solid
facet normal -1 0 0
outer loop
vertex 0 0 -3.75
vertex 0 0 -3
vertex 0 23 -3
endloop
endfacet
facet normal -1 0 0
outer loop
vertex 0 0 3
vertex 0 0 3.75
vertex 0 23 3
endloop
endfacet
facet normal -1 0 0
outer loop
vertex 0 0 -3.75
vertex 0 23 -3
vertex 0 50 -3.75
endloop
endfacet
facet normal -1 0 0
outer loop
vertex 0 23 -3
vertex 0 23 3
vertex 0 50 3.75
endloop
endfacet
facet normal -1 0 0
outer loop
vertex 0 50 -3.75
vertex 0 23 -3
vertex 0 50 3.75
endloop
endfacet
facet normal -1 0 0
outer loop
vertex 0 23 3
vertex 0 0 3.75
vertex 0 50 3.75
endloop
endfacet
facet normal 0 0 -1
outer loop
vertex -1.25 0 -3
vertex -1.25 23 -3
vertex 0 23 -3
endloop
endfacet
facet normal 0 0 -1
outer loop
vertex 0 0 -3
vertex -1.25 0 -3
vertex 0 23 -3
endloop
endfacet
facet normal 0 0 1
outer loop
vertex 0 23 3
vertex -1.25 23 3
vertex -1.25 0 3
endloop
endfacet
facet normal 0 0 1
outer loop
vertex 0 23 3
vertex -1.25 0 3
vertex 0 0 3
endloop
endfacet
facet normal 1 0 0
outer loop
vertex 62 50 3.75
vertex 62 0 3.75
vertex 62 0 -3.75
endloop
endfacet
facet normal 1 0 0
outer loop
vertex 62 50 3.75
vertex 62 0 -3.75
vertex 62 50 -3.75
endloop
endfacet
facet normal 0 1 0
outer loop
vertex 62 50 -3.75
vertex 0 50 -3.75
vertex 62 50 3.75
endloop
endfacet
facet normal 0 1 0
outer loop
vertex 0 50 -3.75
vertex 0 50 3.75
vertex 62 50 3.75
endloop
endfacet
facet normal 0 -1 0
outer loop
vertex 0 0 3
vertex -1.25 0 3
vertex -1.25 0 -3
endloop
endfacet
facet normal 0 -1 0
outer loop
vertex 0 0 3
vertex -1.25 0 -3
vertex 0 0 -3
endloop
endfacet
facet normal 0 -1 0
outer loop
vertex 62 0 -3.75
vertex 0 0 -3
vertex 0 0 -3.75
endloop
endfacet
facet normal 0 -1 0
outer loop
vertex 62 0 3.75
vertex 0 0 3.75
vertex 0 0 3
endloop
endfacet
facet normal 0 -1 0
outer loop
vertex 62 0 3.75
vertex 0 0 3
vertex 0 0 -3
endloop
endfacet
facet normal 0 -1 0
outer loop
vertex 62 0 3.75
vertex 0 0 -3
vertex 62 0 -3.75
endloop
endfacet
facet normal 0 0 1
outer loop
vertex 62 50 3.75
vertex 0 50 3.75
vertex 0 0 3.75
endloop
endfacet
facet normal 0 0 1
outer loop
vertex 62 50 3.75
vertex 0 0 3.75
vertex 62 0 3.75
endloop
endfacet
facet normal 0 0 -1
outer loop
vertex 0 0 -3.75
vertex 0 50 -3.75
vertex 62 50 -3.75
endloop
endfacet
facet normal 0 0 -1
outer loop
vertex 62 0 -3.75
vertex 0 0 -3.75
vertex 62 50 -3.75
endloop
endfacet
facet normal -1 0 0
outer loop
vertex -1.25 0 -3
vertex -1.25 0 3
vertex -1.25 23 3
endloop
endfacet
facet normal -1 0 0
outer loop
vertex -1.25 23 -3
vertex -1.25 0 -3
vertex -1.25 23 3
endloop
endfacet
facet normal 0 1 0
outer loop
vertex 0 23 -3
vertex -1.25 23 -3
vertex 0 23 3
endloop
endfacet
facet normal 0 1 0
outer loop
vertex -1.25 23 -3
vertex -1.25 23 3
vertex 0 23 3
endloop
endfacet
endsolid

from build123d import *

# Parameters (mm, degrees)
SKETCH_W     = 62
SKETCH_H     = 50
PAD_DEPTH    = 3.75
SKETCH001_W  = 1.25
SKETCH001_H  = 23
PAD001_DEPTH = 3


with BuildPart() as part:
    # Sketch → Pad (new body, symmetric)
    with BuildSketch(Plane.XY):
        with Locations((31, 25)):
            Rectangle(SKETCH_W, SKETCH_H)
    extrude(amount=PAD_DEPTH, both=True)

    # Sketch001 → Pad001 (join, symmetric)
    with BuildSketch(Plane.XY):
        with Locations((-0.625, 11.5)):
            Rectangle(SKETCH001_W, SKETCH001_H)
    extrude(amount=PAD001_DEPTH, both=True)


solid = part.part
